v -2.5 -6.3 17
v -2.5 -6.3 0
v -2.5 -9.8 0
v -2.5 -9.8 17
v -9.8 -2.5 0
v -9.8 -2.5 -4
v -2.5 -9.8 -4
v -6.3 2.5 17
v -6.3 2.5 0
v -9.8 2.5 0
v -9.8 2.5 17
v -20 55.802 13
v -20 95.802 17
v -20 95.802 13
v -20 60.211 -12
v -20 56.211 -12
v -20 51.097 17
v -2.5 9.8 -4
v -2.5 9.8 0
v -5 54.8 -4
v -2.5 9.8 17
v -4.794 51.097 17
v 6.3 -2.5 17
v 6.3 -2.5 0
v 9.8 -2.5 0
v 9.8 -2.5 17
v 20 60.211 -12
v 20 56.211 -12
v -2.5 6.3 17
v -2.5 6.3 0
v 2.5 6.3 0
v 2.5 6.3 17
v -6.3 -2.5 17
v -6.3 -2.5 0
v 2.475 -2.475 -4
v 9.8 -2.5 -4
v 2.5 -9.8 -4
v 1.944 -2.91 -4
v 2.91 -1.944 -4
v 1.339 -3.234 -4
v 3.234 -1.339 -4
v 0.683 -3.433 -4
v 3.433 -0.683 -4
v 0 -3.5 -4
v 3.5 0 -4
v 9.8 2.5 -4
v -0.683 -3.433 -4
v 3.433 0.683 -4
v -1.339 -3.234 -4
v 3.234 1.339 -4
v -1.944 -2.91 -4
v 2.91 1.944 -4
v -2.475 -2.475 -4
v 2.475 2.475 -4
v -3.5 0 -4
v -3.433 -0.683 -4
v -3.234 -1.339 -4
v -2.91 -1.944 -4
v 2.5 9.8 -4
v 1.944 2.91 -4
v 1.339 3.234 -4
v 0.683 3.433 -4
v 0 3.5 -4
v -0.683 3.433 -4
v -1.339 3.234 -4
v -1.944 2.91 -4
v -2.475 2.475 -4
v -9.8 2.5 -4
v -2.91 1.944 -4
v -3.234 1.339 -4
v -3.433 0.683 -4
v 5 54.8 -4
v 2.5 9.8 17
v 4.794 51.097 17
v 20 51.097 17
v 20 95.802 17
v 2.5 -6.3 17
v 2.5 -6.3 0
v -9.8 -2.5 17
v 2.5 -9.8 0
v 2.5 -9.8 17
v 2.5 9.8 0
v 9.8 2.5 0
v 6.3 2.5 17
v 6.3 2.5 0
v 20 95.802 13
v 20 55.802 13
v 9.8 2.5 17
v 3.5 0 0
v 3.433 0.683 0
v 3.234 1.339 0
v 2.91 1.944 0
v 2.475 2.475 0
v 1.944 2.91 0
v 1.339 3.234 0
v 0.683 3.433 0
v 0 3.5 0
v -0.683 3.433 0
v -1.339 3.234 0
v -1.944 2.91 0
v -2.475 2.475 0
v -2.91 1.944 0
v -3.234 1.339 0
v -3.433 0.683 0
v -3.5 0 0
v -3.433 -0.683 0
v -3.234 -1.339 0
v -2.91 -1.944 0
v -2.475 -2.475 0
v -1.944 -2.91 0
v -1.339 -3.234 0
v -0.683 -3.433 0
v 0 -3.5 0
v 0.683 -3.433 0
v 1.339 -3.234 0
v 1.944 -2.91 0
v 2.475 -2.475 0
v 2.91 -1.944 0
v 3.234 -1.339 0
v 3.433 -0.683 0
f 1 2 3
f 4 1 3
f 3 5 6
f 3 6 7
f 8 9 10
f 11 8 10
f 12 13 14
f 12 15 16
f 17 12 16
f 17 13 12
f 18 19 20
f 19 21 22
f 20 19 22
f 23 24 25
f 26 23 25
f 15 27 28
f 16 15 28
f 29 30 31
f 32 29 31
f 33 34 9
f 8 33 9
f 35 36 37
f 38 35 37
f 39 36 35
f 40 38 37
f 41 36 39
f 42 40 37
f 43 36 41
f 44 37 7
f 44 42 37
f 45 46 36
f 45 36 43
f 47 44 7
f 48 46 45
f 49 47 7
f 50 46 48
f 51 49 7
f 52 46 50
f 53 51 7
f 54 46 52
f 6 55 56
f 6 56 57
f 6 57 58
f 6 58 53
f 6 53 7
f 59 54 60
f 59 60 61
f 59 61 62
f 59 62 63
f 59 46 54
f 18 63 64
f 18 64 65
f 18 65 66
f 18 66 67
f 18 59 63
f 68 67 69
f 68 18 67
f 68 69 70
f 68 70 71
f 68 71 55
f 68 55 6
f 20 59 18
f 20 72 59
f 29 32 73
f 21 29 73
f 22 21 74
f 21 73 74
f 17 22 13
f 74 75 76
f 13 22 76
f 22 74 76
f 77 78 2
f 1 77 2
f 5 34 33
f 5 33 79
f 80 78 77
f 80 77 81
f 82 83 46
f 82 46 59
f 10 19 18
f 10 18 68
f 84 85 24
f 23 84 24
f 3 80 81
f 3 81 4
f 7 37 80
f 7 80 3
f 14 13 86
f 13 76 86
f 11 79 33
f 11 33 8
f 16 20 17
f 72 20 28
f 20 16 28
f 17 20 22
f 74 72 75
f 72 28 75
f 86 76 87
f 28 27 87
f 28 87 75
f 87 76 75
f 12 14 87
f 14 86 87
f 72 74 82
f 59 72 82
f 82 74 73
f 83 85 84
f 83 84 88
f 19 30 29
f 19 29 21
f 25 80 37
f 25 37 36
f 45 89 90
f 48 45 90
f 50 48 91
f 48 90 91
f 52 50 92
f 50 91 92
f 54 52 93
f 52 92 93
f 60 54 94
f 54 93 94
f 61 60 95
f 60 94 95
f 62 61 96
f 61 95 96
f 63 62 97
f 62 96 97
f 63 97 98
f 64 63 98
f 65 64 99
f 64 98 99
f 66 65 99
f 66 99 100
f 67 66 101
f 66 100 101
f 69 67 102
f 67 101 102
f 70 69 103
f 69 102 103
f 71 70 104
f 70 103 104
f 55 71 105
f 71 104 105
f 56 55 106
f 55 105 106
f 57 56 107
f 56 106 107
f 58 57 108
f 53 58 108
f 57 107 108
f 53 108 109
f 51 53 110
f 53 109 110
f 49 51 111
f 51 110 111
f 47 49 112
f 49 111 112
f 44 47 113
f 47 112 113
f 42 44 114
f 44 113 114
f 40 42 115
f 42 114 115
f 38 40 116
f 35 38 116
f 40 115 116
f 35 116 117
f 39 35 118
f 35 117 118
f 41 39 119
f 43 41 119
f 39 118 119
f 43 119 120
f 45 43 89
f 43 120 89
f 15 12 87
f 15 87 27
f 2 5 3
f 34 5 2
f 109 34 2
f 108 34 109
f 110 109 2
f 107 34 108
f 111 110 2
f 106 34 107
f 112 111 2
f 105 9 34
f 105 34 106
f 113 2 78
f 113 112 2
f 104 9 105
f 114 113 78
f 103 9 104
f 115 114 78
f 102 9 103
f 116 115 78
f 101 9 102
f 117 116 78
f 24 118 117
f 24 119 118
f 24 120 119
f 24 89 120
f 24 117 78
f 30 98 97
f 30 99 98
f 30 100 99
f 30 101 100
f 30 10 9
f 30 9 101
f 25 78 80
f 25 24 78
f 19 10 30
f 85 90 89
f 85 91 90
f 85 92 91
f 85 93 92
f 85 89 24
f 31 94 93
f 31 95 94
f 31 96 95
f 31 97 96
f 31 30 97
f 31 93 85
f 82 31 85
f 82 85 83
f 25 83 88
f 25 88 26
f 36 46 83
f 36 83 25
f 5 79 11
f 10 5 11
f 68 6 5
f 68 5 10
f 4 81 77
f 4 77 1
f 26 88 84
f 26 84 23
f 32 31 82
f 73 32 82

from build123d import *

# Parameters (mm, degrees)
SKETCH_R           = 3.5
PAD_DEPTH          = 4
SKETCH001_W        = 5
SKETCH001_H        = 3.5
PAD001_DEPTH       = 17
POLARPATTERN_COUNT = 4
PAD002_DEPTH       = 17
PAD004_DEPTH       = 4
PAD005_DEPTH       = 20


with BuildPart() as part:
    # Sketch → Pad (new body)
    with BuildSketch(Plane.XY):
        Polygon((-9.8, 2.5), (-9.8, -2.5), (-2.5, -9.8), (2.5, -9.8), (9.8, -2.5), (9.8, 2.5), (2.5, 9.8), (-2.5, 9.8), align=None)
        Circle(SKETCH_R, mode=Mode.SUBTRACT)
    extrude(amount=-PAD_DEPTH)

    # Sketch001 → Pad001 (join)
    with BuildSketch(Plane.XY):
        with Locations((0, 8.05)):
            Rectangle(SKETCH001_W, SKETCH001_H)
    pad001 = extrude(amount=PAD001_DEPTH)

    # PolarPattern: Pad001 ×4 about axis
    polarpattern_axis = Axis((0, 0, 0), (0, 0, 1))
    for i in range(1, POLARPATTERN_COUNT):
        add(pad001.rotate(polarpattern_axis, i * 360 / POLARPATTERN_COUNT))

    # Sketch002 → Pad002 (join)
    with BuildSketch(Plane.XY):
        Polygon((-2.5, 9.8), (-5, 54.8), (5, 54.8), (2.5, 9.8), align=None)
    extrude(amount=PAD002_DEPTH)

    # Sketch002 → Pad004 (join)
    with BuildSketch(Plane.XY):
        Polygon((-2.5, 9.8), (-5, 54.8), (5, 54.8), (2.5, 9.8), align=None)
    extrude(amount=-PAD004_DEPTH)

    # Sketch003 → Pad005 (join, symmetric)
    with BuildSketch(Plane.YZ):
        Polygon((51.097133, 17), (95.802441, 17), (95.802441, 13), (55.802441, 13), (60.210616, -12), (56.210616, -12), align=None)
    extrude(amount=PAD005_DEPTH, both=True)


solid = part.part
